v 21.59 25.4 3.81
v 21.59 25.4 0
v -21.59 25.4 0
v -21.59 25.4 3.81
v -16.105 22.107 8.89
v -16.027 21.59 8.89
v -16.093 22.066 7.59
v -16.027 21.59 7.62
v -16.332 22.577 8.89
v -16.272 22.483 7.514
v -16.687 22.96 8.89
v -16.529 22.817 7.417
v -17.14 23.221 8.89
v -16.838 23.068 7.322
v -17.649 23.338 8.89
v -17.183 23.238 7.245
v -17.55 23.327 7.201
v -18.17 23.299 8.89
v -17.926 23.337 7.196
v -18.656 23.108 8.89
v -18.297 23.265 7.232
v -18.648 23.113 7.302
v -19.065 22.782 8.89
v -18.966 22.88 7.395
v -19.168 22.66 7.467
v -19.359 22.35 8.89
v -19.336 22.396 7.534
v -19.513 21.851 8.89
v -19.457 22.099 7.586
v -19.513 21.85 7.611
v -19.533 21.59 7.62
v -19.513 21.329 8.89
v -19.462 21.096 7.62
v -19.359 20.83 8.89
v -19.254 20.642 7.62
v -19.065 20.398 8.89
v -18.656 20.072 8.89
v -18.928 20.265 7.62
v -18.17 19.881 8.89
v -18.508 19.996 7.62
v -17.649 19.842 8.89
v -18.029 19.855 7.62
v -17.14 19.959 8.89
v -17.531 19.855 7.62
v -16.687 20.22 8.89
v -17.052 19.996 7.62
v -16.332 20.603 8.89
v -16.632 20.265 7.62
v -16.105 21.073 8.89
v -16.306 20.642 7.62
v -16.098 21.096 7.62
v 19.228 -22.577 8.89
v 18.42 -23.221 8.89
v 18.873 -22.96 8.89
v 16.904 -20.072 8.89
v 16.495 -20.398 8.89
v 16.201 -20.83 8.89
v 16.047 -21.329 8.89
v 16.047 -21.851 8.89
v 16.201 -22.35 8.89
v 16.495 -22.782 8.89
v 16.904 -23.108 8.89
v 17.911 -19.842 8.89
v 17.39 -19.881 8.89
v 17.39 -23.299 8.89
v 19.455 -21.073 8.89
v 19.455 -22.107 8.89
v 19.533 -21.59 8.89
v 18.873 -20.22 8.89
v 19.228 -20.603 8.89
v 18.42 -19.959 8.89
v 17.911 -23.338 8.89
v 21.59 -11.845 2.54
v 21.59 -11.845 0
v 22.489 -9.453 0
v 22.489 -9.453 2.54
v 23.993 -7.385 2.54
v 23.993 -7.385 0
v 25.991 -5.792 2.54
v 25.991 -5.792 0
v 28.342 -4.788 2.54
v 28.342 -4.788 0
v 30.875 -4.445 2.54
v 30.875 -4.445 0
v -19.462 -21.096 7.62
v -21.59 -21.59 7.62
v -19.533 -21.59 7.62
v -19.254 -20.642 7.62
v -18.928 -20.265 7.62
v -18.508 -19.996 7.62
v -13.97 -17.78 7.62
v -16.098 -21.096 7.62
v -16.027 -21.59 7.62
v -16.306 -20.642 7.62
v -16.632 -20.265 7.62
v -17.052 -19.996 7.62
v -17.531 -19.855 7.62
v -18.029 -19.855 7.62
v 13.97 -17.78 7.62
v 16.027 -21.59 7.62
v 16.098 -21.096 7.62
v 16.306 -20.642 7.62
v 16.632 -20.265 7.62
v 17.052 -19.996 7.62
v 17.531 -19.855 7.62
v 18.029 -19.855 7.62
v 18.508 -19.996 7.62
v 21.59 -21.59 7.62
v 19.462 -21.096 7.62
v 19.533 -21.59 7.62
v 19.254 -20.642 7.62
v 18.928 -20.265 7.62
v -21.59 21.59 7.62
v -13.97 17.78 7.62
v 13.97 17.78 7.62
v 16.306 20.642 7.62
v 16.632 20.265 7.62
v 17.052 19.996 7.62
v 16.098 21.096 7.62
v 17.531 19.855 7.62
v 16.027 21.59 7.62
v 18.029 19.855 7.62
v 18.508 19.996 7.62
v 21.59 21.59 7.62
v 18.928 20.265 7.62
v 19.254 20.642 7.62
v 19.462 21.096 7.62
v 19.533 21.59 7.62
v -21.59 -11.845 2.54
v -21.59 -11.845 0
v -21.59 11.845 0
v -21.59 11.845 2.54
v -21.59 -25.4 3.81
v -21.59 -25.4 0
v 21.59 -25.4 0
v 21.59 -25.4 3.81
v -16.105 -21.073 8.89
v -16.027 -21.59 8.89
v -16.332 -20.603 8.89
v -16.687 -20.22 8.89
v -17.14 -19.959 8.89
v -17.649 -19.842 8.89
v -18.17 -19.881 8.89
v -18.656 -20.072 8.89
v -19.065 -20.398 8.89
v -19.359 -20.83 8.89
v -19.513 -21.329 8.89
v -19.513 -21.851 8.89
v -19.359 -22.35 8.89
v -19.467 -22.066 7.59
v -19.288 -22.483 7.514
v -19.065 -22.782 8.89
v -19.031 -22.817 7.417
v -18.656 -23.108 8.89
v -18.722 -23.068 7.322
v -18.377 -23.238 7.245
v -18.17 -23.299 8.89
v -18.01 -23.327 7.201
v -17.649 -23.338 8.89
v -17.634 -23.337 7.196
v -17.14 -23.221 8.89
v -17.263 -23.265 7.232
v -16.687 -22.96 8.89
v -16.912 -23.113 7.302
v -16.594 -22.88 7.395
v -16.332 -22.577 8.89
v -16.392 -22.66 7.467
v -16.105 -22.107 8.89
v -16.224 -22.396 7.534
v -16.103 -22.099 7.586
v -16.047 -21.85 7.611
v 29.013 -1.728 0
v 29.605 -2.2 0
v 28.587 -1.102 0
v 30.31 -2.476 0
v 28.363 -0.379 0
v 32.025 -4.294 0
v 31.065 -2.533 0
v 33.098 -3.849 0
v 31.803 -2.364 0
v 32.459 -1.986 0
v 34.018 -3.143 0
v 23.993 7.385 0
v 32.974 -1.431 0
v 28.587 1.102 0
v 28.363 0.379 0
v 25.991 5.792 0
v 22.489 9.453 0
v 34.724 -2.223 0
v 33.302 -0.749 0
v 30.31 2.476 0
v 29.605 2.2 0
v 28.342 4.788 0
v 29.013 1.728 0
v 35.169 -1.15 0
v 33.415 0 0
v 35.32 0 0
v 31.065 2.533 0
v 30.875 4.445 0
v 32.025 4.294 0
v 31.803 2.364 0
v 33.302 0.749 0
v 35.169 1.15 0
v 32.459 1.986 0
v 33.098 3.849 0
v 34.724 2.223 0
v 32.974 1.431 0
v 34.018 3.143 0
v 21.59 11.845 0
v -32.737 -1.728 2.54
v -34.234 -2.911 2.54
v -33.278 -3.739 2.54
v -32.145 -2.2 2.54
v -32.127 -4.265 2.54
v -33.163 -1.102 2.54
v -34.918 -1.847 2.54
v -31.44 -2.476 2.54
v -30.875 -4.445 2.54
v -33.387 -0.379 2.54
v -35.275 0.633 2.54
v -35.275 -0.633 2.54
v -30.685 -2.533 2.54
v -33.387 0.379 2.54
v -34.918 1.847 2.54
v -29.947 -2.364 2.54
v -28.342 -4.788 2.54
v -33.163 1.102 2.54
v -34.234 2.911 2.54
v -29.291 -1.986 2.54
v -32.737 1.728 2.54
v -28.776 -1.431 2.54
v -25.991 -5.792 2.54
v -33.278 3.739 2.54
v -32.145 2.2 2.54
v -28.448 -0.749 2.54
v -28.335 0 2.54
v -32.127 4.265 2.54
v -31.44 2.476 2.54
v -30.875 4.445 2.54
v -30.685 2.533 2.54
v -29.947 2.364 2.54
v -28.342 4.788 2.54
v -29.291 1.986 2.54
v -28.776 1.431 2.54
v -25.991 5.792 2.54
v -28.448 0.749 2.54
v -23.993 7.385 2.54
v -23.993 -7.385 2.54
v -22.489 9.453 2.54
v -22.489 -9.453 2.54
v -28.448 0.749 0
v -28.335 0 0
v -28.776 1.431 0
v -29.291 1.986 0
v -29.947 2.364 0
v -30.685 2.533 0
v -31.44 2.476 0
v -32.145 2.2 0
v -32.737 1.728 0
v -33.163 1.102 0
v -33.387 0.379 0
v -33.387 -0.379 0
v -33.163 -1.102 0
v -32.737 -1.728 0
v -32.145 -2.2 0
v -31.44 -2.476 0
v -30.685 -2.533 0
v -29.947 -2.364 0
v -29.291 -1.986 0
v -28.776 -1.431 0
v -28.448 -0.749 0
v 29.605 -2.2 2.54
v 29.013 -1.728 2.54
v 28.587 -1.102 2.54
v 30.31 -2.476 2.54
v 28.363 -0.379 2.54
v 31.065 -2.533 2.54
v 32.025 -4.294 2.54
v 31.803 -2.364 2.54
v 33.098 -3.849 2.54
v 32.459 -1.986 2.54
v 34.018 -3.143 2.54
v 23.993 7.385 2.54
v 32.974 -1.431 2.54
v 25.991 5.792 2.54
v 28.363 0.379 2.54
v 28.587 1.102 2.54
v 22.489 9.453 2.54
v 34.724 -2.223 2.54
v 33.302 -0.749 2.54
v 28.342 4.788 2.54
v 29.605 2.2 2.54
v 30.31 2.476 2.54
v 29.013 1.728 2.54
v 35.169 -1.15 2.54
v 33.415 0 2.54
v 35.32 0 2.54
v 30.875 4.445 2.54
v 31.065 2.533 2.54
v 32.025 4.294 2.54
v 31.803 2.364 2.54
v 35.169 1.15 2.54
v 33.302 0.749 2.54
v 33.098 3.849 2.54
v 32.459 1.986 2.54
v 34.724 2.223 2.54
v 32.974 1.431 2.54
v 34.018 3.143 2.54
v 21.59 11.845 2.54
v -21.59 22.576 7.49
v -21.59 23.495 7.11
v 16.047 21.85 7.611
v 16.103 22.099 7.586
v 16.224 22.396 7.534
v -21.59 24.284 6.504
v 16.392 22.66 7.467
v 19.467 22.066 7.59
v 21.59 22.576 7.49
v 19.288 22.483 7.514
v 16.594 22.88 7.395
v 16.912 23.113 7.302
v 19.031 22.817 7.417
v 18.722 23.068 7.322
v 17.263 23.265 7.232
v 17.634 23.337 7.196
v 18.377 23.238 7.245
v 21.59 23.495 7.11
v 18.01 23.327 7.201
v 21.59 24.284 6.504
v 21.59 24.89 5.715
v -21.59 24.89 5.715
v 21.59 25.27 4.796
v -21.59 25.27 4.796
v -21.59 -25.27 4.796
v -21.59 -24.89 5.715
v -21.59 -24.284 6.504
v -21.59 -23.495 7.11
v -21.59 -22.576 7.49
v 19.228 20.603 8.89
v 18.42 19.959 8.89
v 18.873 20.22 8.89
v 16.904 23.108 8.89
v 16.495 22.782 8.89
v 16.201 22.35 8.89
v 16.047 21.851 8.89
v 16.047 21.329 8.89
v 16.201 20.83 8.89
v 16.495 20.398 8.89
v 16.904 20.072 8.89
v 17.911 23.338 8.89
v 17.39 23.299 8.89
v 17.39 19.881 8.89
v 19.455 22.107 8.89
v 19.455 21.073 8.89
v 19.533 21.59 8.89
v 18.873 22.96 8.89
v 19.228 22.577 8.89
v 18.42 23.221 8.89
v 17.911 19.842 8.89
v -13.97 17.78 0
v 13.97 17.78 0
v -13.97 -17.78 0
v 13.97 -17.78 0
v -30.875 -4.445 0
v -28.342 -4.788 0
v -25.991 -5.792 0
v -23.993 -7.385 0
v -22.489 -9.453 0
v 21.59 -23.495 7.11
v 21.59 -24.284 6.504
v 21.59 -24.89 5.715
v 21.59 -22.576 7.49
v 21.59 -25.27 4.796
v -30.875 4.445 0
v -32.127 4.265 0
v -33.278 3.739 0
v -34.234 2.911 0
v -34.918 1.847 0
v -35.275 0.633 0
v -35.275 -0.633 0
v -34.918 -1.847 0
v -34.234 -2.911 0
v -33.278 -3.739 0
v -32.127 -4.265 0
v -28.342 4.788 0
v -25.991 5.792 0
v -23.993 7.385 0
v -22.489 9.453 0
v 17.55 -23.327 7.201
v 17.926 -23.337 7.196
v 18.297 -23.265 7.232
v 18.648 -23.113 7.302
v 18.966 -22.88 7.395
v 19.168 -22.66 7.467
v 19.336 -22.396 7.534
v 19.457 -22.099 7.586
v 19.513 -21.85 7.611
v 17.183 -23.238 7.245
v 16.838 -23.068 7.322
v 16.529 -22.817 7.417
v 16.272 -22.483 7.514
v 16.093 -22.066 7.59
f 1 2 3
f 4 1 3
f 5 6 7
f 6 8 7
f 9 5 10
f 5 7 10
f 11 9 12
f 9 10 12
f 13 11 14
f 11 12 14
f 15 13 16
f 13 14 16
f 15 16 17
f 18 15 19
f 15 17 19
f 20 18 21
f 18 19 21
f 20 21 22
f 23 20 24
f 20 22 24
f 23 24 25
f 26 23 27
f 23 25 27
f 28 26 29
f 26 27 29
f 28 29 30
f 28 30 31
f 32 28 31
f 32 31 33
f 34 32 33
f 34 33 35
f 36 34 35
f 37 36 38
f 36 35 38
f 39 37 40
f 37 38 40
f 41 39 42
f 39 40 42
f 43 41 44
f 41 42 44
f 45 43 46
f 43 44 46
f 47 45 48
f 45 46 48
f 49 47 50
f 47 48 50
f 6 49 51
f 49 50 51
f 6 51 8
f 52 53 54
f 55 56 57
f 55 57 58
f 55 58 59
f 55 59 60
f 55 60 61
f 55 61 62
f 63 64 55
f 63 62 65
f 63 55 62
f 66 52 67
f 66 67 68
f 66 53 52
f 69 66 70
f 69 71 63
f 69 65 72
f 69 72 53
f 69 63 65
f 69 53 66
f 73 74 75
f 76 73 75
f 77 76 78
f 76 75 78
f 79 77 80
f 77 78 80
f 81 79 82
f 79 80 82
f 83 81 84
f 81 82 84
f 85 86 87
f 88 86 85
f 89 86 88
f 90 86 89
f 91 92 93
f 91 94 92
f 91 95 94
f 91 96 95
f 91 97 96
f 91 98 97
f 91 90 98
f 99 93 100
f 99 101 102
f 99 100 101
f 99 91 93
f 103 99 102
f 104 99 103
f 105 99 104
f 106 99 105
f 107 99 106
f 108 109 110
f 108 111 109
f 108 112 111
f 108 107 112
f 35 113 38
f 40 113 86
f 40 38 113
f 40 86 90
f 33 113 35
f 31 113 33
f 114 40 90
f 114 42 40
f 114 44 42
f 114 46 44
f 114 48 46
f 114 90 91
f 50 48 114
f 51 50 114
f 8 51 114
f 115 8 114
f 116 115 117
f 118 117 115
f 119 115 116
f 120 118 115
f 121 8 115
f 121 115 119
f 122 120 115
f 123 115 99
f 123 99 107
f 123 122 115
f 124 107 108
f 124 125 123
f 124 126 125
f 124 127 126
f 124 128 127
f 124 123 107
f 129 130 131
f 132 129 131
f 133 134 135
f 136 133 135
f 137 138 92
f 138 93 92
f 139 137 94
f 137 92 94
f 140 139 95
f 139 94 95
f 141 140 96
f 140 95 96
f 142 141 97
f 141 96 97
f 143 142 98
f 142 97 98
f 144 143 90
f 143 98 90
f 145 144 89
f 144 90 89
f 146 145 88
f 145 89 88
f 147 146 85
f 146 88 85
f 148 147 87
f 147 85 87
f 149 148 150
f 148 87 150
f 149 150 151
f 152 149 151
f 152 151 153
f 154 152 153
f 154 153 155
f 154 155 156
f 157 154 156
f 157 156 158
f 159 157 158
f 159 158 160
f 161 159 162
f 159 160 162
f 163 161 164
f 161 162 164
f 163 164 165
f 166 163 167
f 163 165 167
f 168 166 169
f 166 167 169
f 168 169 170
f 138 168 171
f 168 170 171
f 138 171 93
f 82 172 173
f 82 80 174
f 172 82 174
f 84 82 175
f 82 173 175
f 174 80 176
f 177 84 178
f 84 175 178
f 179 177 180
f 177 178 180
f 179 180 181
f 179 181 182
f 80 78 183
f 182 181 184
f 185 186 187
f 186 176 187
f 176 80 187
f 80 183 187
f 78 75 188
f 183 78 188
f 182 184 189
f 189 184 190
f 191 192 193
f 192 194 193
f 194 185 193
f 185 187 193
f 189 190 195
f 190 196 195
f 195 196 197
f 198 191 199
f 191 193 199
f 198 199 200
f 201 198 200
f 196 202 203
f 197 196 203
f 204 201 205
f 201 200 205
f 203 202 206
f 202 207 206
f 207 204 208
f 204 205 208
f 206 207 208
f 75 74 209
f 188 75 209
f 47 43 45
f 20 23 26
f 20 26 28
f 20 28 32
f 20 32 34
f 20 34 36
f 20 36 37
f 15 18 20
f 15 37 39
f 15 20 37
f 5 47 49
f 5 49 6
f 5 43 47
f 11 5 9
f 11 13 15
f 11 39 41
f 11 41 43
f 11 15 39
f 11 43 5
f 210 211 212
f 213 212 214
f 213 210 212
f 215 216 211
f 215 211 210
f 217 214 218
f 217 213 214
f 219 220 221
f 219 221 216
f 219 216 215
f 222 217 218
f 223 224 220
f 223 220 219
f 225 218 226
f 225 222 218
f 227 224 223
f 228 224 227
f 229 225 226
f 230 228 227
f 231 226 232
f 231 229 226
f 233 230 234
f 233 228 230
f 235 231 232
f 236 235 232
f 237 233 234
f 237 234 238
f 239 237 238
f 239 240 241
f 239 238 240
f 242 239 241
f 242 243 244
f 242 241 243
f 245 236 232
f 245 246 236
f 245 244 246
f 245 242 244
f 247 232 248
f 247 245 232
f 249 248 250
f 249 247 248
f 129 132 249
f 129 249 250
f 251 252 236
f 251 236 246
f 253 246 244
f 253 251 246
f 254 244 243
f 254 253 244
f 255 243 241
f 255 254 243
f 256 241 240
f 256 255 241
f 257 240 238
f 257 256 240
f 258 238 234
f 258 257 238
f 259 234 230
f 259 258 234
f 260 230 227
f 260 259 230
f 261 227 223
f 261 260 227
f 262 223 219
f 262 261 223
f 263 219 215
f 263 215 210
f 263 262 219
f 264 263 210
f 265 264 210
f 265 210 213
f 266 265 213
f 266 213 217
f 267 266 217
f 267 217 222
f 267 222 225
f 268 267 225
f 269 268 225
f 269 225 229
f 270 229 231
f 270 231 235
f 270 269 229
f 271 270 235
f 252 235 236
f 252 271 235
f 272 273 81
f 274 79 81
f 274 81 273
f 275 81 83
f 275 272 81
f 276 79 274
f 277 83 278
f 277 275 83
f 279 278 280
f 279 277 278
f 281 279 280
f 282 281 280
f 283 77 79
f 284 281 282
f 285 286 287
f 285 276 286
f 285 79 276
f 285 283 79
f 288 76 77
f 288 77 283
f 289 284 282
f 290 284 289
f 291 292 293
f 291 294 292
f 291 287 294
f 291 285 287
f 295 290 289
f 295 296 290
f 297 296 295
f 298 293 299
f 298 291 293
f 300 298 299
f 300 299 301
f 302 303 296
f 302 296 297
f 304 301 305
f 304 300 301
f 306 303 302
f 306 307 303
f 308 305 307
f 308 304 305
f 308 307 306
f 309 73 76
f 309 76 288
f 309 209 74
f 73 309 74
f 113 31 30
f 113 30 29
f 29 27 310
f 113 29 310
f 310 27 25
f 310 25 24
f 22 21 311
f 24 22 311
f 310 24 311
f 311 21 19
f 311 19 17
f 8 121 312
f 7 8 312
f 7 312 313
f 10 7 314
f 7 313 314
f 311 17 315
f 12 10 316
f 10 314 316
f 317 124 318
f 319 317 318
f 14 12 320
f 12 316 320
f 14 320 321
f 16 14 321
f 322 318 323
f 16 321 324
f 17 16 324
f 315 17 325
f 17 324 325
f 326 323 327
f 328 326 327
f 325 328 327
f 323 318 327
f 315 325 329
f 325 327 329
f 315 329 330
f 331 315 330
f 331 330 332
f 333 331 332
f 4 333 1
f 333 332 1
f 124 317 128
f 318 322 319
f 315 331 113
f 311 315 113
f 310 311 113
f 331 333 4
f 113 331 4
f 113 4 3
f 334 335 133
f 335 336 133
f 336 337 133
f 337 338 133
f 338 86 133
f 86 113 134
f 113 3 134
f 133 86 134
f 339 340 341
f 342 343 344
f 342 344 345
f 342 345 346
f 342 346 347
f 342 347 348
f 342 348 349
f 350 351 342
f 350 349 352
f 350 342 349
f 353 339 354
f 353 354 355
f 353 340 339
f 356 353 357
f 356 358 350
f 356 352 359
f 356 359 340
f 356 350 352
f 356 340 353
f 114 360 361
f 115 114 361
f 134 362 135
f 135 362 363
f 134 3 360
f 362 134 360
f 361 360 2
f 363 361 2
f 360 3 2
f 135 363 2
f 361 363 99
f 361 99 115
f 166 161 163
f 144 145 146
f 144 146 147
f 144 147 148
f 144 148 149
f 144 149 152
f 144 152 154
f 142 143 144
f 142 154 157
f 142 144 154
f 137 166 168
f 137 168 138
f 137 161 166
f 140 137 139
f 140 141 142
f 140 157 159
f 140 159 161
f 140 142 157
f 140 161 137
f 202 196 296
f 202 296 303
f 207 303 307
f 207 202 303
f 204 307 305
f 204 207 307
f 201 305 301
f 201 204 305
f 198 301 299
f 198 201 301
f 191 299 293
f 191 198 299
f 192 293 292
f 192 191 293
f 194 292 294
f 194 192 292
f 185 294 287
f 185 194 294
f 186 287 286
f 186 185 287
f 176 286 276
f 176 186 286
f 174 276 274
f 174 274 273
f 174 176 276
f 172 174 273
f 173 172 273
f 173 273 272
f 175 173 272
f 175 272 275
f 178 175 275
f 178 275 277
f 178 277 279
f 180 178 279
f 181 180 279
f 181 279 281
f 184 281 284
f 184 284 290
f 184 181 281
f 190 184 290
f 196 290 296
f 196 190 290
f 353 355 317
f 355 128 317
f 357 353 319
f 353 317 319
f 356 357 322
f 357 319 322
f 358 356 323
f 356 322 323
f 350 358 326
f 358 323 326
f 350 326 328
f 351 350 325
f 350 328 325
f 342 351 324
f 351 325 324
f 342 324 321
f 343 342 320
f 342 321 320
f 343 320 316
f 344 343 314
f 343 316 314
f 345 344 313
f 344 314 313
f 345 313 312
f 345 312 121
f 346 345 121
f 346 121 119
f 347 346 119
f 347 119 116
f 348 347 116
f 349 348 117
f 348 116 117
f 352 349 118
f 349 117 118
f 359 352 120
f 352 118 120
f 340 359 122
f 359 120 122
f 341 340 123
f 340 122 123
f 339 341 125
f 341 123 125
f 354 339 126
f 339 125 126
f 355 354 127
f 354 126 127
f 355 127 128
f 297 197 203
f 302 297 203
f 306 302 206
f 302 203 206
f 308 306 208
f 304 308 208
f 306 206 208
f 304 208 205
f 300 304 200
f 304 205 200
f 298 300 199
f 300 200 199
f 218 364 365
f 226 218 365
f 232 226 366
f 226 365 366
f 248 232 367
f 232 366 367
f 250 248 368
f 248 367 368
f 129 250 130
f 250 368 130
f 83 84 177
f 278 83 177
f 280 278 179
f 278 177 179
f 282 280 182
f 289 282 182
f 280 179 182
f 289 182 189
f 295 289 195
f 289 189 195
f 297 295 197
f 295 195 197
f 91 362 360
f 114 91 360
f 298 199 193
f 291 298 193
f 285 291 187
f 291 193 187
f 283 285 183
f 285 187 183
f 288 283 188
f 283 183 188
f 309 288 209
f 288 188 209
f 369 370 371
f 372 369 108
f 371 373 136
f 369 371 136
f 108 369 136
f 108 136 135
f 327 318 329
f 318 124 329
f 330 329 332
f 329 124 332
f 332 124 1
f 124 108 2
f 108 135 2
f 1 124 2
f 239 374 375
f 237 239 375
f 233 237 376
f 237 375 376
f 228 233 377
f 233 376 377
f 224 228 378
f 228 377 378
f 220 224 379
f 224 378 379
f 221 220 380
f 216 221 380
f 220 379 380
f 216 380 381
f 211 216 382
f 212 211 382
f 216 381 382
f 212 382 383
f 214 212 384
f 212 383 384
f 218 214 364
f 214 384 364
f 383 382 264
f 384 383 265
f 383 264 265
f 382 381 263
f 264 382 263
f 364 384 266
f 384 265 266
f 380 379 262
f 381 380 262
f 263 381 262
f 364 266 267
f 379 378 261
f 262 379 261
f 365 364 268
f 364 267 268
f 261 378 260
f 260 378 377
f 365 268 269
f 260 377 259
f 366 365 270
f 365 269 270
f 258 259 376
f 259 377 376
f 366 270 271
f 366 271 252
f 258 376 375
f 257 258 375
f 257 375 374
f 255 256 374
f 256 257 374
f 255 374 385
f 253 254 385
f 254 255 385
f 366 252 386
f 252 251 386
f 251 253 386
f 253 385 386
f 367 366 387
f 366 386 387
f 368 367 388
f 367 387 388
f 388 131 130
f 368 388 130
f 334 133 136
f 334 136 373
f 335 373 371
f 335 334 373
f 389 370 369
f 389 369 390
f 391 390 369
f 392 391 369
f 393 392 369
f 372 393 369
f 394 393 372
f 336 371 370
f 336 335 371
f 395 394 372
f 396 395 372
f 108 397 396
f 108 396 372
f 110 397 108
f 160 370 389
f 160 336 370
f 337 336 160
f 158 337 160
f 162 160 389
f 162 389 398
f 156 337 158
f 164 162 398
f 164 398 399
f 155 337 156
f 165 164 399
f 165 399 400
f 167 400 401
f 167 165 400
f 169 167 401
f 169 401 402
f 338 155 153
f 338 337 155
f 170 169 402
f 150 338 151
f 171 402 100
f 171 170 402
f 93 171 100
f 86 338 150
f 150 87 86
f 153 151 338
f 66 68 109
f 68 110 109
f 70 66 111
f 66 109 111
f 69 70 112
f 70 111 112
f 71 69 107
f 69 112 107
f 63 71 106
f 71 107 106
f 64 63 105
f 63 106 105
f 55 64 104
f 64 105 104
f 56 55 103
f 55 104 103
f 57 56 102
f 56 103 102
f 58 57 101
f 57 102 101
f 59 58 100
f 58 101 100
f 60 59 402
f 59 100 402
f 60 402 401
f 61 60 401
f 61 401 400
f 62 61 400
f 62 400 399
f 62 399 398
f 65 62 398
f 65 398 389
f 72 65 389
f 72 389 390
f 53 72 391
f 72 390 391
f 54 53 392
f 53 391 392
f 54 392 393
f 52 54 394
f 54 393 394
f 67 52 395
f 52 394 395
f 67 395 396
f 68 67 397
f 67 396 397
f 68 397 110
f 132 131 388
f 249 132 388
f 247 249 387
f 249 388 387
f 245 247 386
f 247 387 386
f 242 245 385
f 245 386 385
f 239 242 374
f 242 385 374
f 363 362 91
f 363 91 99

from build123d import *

# Parameters (mm, degrees)
F0_R         = 2.54
F1_DEPTH     = 2.54
F0_R_2       = 1.7526
F0_W         = 27.94
F0_H         = 35.56
F2_DEPTH     = 7.62
F3_DEPTH     = 8.89
F4_T4_DEPTH  = 62.23
F4_S5_R      = 1.7526
F4_T6_DEPTH  = 33
F4_S7_R      = 1.7526
F4_T8_DEPTH  = 33
F4_T12_DEPTH = 62.23
F4_S13_R     = 1.7526
F4_T14_DEPTH = 33
F4_S15_R     = 1.7526
F4_T16_DEPTH = 33


# Not quite as in the source:
# - a fillet or chamfer that OpenCascade refuses, or shapes differently, is made with other operations: its cross-section is extruded or revolved along the edge and cut away or added


with BuildPart() as f1:
    # F0 (on Top) → F1 (new body)
    with BuildSketch(Plane.XY):
        with BuildLine():
            ThreePointArc((-30.875, -4.445), (-24.9383449811, -6.5213926009), (-21.59, -11.8452882548))
            Line((-21.59, -11.8452882548), (-21.59, 11.8452882548))
            ThreePointArc((-21.59, 11.8452882548), (-24.9383449811, 6.5213926009), (-30.875, 4.445))
            ThreePointArc((-30.875, 4.445), (-27.7319103576, 3.1430896424), (-26.43, 0))
            ThreePointArc((-26.43, 0), (-27.7319103576, -3.1430896424), (-30.875, -4.445))
        make_face()
        with BuildLine():
            ThreePointArc((-30.875, 4.445), (-35.32, 0), (-30.875, -4.445))
            ThreePointArc((-30.875, -4.445), (-27.7319103576, -3.1430896424), (-26.43, 0))
            ThreePointArc((-26.43, 0), (-27.7319103576, 3.1430896424), (-30.875, 4.445))
        make_face()
        with Locations((-30.875, 0)):
            Circle(F0_R, mode=Mode.SUBTRACT)
    extrude(amount=F1_DEPTH)


with BuildPart() as f1b:
    # F0 (on Top) → F1, piece 2 (new body)
    with BuildSketch(Plane.XY):
        with BuildLine():
            Line((21.59, 11.8452882548), (21.59, -11.8452882548))
            ThreePointArc((21.59, -11.8452882548), (24.9383449811, -6.5213926009), (30.875, -4.445))
            ThreePointArc((30.875, -4.445), (26.43, 0), (30.875, 4.445))
            ThreePointArc((30.875, 4.445), (24.9383449811, 6.5213926009), (21.59, 11.8452882548))
        make_face()
        with BuildLine():
            ThreePointArc((30.875, 4.445), (26.43, 0), (30.875, -4.445))
            ThreePointArc((30.875, -4.445), (34.0180896424, -3.1430896424), (35.32, 0))
            ThreePointArc((35.32, 0), (34.0180896424, 3.1430896424), (30.875, 4.445))
        make_face()
        with Locations((30.875, 0)):
            Circle(F0_R, mode=Mode.SUBTRACT)
    extrude(amount=F1_DEPTH)


with BuildPart() as f2:
    # F0 (on Top) → F2 (new body)
    with BuildSketch(Plane.XY):
        Polygon((-21.59, -25.4), (21.59, -25.4), (21.59, -11.8452882548), (21.59, 11.8452882548), (21.59, 25.4), (-21.59, 25.4), (-21.59, 11.8452882548), (-21.59, -11.8452882548), align=None)
        with Locations((-17.78, -21.59)):
            Circle(F0_R_2, mode=Mode.SUBTRACT)
        with Locations((17.78, -21.59)):
            Circle(F0_R_2, mode=Mode.SUBTRACT)
        Rectangle(F0_W, F0_H, mode=Mode.SUBTRACT)
        with Locations((-17.78, 21.59)):
            Circle(F0_R_2, mode=Mode.SUBTRACT)
        with Locations((17.78, 21.59)):
            Circle(F0_R_2, mode=Mode.SUBTRACT)
    extrude(amount=F2_DEPTH)

    # F0 (on Top) → F3 (join)
    with BuildSketch(Plane.XY):
        with Locations((-17.78, 21.59)):
            Circle(F0_R_2)
        with Locations((-17.78, -21.59)):
            Circle(F0_R_2)
        with Locations((17.78, -21.59)):
            Circle(F0_R_2)
        with Locations((17.78, 21.59)):
            Circle(F0_R_2)
    extrude(amount=F3_DEPTH)

    # F4: fillet of radius 3.81 on 2 edges, made by hand


with BuildPart() as f4_tool2:
    # F4_s3 → F4_t4 (new body)
    with BuildSketch(Plane.YZ.offset(-31.115)):
        with BuildLine():
            ThreePointArc((-25.4, 3.81), (-24.2840768363, 6.5040768363), (-21.59, 7.62))
            Line((-21.59, 7.62), (-25.4, 7.62))
            Line((-25.4, 7.62), (-25.4, 3.81))
        make_face()
    extrude(amount=F4_T4_DEPTH)

    # F4_s5 → F4_t6 (cut, symmetric)
    with BuildSketch(Plane.XY.offset(5.7)):
        with Locations((-17.78, -21.59)):
            Circle(F4_S5_R)
    extrude(amount=F4_T6_DEPTH, both=True, mode=Mode.SUBTRACT)

    # F4_s7 → F4_t8 (cut, symmetric)
    with BuildSketch(Plane.XY.offset(5.7)):
        with Locations((17.78, -21.59)):
            Circle(F4_S7_R)
    extrude(amount=F4_T8_DEPTH, both=True, mode=Mode.SUBTRACT)


with BuildPart() as f2_1:
    add(f2.part)

    # F4_t1: cut F4_tool2
    add(f4_tool2.part, mode=Mode.SUBTRACT)


with BuildPart() as f4_tool10:
    # F4_s11 → F4_t12 (new body)
    with BuildSketch(Plane.YZ.offset(31.115)):
        with BuildLine():
            ThreePointArc((21.59, 7.62), (24.2840768363, 6.5040768363), (25.4, 3.81))
            Line((25.4, 3.81), (25.4, 7.62))
            Line((25.4, 7.62), (21.59, 7.62))
        make_face()
    extrude(amount=-F4_T12_DEPTH)

    # F4_s13 → F4_t14 (cut, symmetric)
    with BuildSketch(Plane.XY.offset(5.7)):
        with Locations((-17.78, 21.59)):
            Circle(F4_S13_R)
    extrude(amount=F4_T14_DEPTH, both=True, mode=Mode.SUBTRACT)

    # F4_s15 → F4_t16 (cut, symmetric)
    with BuildSketch(Plane.XY.offset(5.7)):
        with Locations((17.78, 21.59)):
            Circle(F4_S15_R)
    extrude(amount=F4_T16_DEPTH, both=True, mode=Mode.SUBTRACT)


with BuildPart() as f2_2:
    add(f2_1.part)

    # F4_t9: cut F4_tool10
    add(f4_tool10.part, mode=Mode.SUBTRACT)


solid = Compound([f1.part, f1b.part, f2_2.part])
